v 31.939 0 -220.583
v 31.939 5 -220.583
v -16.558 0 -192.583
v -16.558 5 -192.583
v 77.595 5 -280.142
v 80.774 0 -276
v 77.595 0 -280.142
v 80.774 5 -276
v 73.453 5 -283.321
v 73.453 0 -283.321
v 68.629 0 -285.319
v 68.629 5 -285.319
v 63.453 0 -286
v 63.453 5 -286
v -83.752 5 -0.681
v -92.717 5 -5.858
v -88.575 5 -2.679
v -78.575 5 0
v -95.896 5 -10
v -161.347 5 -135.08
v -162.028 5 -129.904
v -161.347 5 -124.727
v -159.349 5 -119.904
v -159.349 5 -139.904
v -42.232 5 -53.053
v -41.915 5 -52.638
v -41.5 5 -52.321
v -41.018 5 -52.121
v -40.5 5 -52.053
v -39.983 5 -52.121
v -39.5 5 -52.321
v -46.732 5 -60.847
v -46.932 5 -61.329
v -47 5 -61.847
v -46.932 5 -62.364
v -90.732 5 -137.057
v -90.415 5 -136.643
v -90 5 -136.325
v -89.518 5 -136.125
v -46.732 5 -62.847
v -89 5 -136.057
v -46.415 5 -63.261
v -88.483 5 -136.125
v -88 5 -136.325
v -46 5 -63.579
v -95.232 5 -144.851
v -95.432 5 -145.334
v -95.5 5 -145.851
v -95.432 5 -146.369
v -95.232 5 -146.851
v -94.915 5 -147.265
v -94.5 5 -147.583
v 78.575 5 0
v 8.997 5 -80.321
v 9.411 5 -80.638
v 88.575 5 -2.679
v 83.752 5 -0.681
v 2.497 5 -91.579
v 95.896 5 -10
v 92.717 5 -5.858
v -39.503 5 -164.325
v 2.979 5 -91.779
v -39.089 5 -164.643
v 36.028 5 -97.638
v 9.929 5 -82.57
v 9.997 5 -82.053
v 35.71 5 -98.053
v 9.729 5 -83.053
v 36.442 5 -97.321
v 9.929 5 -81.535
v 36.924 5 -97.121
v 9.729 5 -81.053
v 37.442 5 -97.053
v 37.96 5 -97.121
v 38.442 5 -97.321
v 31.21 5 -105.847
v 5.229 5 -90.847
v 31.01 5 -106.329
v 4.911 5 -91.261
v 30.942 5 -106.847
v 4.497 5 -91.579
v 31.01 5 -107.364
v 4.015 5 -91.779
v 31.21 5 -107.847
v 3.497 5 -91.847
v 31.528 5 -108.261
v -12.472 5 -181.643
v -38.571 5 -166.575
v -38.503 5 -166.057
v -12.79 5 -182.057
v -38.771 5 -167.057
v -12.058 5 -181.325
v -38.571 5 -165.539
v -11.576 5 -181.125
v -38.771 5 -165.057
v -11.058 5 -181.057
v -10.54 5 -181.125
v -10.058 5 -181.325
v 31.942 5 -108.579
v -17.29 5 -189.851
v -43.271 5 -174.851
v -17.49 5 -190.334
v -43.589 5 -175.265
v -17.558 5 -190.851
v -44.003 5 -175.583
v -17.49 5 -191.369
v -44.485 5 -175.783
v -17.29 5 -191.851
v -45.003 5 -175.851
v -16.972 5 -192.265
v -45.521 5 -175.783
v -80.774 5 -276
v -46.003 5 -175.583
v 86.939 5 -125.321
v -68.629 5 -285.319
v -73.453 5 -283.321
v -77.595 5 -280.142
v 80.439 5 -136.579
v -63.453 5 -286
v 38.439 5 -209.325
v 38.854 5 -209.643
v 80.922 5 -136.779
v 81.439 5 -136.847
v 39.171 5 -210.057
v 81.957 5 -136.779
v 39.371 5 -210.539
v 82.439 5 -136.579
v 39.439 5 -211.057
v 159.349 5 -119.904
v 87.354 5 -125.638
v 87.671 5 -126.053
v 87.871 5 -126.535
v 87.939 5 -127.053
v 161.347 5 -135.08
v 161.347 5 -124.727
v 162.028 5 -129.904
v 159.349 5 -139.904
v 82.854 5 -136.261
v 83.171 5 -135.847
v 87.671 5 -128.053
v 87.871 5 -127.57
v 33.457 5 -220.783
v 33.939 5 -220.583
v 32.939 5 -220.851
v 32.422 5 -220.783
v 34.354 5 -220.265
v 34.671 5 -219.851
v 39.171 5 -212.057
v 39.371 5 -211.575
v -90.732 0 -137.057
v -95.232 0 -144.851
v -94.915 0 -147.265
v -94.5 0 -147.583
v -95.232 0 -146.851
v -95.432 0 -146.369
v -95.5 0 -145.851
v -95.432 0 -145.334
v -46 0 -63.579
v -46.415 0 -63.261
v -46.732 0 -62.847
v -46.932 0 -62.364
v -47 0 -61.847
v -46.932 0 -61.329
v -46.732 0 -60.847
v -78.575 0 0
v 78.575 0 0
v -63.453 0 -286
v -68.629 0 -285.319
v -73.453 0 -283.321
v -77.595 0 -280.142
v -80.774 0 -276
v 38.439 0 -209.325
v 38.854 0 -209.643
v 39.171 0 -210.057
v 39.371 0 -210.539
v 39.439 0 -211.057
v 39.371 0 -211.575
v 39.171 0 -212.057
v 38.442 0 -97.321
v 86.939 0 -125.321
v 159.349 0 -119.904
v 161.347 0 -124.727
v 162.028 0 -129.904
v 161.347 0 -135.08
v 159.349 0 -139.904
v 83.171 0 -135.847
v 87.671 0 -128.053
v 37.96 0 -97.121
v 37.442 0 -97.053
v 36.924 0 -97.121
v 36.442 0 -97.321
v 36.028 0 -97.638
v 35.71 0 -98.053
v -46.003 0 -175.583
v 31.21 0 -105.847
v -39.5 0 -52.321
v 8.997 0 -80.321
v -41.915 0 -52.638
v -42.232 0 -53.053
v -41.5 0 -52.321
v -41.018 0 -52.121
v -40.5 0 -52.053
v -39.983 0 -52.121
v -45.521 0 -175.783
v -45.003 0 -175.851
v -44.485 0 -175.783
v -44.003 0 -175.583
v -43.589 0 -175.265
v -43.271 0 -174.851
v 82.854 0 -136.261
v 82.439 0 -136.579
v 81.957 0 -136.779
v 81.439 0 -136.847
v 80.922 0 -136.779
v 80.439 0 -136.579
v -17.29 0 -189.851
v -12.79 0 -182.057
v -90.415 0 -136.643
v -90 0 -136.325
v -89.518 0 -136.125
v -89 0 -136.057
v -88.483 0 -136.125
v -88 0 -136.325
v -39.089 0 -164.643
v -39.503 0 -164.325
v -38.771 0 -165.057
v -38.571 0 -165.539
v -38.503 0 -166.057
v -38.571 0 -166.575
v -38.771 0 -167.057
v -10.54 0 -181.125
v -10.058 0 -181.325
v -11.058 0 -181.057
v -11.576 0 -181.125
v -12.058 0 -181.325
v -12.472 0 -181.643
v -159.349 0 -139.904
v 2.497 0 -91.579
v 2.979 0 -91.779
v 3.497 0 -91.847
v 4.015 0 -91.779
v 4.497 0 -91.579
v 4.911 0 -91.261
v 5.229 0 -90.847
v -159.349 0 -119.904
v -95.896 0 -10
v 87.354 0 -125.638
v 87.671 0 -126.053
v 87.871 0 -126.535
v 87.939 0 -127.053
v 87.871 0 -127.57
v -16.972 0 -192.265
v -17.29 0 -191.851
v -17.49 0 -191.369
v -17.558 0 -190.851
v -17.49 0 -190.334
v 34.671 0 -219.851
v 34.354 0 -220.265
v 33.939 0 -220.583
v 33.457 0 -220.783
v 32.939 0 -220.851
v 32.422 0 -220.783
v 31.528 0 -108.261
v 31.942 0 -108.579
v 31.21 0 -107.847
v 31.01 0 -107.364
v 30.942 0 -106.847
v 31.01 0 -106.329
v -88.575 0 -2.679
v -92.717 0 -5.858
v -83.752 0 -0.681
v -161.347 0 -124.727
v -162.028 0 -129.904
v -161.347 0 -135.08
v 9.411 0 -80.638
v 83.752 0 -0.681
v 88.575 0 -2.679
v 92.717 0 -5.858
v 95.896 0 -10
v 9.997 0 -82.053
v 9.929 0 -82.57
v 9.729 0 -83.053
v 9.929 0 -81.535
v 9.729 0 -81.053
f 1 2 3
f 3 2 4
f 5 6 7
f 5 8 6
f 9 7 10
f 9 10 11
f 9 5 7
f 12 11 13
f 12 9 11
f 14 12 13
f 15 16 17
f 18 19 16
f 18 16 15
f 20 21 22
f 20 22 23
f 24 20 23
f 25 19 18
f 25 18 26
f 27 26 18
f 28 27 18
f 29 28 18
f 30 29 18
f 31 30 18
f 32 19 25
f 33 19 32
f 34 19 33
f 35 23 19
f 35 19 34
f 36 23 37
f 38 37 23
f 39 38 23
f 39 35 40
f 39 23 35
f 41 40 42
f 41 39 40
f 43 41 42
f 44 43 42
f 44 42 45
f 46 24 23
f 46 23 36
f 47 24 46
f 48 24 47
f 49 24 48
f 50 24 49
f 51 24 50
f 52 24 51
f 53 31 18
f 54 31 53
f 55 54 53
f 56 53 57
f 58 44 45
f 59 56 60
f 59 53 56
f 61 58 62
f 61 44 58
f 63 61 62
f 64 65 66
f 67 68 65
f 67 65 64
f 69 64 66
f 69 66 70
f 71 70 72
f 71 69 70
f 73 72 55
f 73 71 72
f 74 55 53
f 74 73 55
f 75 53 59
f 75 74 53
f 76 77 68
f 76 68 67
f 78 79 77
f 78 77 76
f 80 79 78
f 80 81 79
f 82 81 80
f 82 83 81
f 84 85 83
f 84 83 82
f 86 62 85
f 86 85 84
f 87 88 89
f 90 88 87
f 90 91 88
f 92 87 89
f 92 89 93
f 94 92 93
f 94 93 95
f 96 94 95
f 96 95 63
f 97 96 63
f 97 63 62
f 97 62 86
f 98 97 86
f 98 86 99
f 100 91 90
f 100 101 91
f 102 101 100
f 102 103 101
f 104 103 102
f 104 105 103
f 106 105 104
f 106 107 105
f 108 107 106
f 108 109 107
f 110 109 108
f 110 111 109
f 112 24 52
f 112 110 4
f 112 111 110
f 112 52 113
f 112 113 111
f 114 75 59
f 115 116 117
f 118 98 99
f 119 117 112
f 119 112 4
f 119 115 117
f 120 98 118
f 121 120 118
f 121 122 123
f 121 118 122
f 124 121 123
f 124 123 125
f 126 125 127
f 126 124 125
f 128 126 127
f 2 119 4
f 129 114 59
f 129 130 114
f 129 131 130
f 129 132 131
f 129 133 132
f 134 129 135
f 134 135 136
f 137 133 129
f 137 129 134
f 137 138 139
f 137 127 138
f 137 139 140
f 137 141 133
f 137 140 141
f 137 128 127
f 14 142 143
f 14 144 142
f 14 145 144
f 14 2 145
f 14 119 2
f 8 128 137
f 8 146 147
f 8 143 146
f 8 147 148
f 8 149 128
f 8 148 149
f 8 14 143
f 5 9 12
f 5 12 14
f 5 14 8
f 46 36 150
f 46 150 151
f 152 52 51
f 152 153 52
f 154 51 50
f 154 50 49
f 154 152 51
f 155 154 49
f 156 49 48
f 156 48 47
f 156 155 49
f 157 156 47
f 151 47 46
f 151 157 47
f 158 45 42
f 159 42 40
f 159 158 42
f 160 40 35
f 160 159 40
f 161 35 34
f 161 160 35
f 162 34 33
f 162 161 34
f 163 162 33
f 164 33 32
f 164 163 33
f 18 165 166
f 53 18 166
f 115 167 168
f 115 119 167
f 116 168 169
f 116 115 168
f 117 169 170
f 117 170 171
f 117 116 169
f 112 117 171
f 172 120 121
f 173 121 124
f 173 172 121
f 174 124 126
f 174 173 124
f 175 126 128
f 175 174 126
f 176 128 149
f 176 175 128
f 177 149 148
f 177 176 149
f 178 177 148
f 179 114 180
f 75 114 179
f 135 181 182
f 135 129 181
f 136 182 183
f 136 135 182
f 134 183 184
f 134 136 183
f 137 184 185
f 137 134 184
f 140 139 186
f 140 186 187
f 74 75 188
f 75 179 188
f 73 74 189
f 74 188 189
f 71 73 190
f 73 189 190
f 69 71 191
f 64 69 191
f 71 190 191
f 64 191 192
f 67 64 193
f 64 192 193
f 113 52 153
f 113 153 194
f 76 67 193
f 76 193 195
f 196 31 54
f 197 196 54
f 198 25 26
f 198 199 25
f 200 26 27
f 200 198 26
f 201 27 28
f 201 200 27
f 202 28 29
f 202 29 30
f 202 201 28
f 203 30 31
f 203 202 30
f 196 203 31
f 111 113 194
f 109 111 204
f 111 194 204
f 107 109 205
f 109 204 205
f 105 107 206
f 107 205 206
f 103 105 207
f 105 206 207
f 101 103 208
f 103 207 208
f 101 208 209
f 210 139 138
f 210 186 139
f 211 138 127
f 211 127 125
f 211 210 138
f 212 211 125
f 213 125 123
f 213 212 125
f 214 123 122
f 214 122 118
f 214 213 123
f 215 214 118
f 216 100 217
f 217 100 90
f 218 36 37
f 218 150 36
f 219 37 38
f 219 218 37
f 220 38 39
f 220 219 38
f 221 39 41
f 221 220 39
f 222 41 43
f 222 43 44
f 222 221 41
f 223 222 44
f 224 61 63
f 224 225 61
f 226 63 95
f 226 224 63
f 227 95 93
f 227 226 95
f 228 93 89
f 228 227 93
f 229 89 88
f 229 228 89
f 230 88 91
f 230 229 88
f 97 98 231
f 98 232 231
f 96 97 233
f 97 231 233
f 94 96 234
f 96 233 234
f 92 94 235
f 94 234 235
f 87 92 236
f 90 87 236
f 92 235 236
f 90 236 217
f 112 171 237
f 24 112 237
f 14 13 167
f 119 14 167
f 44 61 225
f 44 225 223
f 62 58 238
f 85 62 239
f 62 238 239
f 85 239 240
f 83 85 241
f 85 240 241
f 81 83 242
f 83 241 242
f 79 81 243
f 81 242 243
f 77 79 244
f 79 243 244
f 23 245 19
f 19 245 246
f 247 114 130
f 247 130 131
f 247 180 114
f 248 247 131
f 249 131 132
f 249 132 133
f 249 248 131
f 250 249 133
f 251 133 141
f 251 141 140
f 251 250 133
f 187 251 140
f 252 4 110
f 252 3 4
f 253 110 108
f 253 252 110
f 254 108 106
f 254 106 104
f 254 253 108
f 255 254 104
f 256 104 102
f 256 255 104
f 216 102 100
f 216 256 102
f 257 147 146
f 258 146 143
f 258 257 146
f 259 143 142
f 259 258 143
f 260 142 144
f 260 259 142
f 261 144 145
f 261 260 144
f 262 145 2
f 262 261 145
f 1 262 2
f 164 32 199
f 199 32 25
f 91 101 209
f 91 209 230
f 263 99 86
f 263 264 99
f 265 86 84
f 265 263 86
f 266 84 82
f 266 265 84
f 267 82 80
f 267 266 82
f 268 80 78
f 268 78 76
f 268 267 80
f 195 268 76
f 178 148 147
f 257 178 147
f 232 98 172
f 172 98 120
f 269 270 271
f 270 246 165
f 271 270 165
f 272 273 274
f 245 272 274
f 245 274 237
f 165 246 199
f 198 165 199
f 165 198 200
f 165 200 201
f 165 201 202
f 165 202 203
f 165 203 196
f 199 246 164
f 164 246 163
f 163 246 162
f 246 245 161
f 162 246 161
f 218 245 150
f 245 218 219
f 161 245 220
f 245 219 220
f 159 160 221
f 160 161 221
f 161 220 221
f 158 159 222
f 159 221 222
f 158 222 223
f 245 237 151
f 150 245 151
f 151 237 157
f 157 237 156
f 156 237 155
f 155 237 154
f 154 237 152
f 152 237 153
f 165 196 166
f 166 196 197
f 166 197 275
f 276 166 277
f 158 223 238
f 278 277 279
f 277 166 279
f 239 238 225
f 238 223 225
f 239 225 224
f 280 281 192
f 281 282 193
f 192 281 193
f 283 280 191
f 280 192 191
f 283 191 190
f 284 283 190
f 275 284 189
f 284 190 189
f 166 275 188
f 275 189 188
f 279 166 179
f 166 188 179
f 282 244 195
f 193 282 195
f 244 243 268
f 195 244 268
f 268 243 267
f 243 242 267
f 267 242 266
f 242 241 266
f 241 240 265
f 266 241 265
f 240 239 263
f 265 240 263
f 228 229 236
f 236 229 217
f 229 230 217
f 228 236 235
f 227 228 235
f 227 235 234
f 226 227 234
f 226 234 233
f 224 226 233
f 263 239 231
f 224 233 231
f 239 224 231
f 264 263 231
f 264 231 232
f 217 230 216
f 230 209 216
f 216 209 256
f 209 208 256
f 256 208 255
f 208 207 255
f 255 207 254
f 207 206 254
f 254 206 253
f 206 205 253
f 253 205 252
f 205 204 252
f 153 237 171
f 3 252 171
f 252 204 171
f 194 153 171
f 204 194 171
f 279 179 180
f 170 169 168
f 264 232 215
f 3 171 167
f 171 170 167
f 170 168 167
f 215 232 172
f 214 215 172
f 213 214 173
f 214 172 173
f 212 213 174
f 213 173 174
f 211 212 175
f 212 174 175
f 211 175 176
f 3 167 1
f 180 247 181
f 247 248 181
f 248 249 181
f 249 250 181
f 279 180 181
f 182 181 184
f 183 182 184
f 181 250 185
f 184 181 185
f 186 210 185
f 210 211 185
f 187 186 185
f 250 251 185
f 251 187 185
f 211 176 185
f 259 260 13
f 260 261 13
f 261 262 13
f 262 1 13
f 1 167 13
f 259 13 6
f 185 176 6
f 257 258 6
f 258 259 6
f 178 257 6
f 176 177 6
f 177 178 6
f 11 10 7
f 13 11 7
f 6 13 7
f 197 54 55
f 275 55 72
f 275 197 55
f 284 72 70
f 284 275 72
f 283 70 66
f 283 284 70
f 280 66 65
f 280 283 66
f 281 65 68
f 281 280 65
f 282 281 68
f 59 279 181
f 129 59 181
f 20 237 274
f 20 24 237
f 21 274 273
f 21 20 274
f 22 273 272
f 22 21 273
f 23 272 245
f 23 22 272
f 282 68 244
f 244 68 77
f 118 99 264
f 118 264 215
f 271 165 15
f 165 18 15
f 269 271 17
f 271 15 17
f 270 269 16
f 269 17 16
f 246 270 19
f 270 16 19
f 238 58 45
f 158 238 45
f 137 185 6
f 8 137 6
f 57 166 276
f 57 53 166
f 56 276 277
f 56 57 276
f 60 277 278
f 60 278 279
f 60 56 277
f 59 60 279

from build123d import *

# Parameters (mm, degrees)
EXTRUDE_1_DEPTH     = 5
FILLET_1_R          = 20
CUT_EXTRUDE_1_DEPTH = 10
FILLET_2_R          = 2


with BuildPart() as part:
    # 草圖1 → 填料-伸長1 (new body)
    with BuildSketch(Plane(origin=(0, 0, 0), x_dir=(1, 0, 0), z_dir=(0, 1, 0))):
        Polygon((-90.122176988, 0), (90.122176988, 0), (165.122176988, 129.903810568), (75, 286), (-75, 286), (-165.122176988, 129.903810568), align=None)
    extrude(amount=EXTRUDE_1_DEPTH)

    # 圓角1
    fillet_1_edges = [part.edges().sort_by_distance(p)[0] for p in [
        (-165.122176988, 2.5, -129.903810568),
        (-75, 2.5, -286),
        (75, 2.5, -286),
        (165.122176988, 2.5, -129.903810568),
        (90.122176988, 2.5, 0),
        (-90.122176988, 2.5, 0),
    ]]
    fillet(fillet_1_edges, radius=FILLET_1_R)

    # 草圖2 → 除料-伸長1 (cut)
    with BuildSketch(Plane(origin=(0, 5, 0), x_dir=(1, 0, 0), z_dir=(0, 1, 0))):
        Polygon((-11.79016319, 180.324972243), (40.171361037, 210.324972243), (33.671361037, 221.583302492), (-18.29016319, 191.583302492), align=None)
        Polygon((-44.270925304, 176.583302492), (-37.770925304, 165.324972243), (-89.732449531, 135.324972243), (-96.232449531, 146.583302492), align=None)
        Polygon((4.229074696, 92.578838325), (-47.732449531, 62.578838325), (-41.232449531, 51.320508076), (10.729074696, 81.320508076), align=None)
        Polygon((36.70983681, 96.320508076), (30.20983681, 107.578838325), (82.171361037, 137.578838325), (88.671361037, 126.320508076), align=None)
    extrude(amount=-CUT_EXTRUDE_1_DEPTH, mode=Mode.SUBTRACT)

    # 圓角2
    fillet_2_edges = [part.edges().sort_by_distance(p)[0] for p in [
        (88.671361037, 2.5, -126.320508076),
        (36.70983681, 2.5, -96.320508076),
        (30.20983681, 2.5, -107.578838325),
        (82.171361037, 2.5, -137.578838325),
        (-11.79016319, 2.5, -180.324972243),
        (-18.29016319, 2.5, -191.583302492),
        (33.671361037, 2.5, -221.583302492),
        (40.171361037, 2.5, -210.324972243),
        (-96.232449531, 2.5, -146.583302492),
        (-44.270925304, 2.5, -176.583302492),
        (-37.770925304, 2.5, -165.324972243),
        (-89.732449531, 2.5, -135.324972243),
        (4.229074696, 2.5, -92.578838325),
        (10.729074696, 2.5, -81.320508076),
        (-41.232449531, 2.5, -51.320508076),
        (-47.732449531, 2.5, -62.578838325),
    ]]
    fillet(fillet_2_edges, radius=FILLET_2_R)


solid = part.part
